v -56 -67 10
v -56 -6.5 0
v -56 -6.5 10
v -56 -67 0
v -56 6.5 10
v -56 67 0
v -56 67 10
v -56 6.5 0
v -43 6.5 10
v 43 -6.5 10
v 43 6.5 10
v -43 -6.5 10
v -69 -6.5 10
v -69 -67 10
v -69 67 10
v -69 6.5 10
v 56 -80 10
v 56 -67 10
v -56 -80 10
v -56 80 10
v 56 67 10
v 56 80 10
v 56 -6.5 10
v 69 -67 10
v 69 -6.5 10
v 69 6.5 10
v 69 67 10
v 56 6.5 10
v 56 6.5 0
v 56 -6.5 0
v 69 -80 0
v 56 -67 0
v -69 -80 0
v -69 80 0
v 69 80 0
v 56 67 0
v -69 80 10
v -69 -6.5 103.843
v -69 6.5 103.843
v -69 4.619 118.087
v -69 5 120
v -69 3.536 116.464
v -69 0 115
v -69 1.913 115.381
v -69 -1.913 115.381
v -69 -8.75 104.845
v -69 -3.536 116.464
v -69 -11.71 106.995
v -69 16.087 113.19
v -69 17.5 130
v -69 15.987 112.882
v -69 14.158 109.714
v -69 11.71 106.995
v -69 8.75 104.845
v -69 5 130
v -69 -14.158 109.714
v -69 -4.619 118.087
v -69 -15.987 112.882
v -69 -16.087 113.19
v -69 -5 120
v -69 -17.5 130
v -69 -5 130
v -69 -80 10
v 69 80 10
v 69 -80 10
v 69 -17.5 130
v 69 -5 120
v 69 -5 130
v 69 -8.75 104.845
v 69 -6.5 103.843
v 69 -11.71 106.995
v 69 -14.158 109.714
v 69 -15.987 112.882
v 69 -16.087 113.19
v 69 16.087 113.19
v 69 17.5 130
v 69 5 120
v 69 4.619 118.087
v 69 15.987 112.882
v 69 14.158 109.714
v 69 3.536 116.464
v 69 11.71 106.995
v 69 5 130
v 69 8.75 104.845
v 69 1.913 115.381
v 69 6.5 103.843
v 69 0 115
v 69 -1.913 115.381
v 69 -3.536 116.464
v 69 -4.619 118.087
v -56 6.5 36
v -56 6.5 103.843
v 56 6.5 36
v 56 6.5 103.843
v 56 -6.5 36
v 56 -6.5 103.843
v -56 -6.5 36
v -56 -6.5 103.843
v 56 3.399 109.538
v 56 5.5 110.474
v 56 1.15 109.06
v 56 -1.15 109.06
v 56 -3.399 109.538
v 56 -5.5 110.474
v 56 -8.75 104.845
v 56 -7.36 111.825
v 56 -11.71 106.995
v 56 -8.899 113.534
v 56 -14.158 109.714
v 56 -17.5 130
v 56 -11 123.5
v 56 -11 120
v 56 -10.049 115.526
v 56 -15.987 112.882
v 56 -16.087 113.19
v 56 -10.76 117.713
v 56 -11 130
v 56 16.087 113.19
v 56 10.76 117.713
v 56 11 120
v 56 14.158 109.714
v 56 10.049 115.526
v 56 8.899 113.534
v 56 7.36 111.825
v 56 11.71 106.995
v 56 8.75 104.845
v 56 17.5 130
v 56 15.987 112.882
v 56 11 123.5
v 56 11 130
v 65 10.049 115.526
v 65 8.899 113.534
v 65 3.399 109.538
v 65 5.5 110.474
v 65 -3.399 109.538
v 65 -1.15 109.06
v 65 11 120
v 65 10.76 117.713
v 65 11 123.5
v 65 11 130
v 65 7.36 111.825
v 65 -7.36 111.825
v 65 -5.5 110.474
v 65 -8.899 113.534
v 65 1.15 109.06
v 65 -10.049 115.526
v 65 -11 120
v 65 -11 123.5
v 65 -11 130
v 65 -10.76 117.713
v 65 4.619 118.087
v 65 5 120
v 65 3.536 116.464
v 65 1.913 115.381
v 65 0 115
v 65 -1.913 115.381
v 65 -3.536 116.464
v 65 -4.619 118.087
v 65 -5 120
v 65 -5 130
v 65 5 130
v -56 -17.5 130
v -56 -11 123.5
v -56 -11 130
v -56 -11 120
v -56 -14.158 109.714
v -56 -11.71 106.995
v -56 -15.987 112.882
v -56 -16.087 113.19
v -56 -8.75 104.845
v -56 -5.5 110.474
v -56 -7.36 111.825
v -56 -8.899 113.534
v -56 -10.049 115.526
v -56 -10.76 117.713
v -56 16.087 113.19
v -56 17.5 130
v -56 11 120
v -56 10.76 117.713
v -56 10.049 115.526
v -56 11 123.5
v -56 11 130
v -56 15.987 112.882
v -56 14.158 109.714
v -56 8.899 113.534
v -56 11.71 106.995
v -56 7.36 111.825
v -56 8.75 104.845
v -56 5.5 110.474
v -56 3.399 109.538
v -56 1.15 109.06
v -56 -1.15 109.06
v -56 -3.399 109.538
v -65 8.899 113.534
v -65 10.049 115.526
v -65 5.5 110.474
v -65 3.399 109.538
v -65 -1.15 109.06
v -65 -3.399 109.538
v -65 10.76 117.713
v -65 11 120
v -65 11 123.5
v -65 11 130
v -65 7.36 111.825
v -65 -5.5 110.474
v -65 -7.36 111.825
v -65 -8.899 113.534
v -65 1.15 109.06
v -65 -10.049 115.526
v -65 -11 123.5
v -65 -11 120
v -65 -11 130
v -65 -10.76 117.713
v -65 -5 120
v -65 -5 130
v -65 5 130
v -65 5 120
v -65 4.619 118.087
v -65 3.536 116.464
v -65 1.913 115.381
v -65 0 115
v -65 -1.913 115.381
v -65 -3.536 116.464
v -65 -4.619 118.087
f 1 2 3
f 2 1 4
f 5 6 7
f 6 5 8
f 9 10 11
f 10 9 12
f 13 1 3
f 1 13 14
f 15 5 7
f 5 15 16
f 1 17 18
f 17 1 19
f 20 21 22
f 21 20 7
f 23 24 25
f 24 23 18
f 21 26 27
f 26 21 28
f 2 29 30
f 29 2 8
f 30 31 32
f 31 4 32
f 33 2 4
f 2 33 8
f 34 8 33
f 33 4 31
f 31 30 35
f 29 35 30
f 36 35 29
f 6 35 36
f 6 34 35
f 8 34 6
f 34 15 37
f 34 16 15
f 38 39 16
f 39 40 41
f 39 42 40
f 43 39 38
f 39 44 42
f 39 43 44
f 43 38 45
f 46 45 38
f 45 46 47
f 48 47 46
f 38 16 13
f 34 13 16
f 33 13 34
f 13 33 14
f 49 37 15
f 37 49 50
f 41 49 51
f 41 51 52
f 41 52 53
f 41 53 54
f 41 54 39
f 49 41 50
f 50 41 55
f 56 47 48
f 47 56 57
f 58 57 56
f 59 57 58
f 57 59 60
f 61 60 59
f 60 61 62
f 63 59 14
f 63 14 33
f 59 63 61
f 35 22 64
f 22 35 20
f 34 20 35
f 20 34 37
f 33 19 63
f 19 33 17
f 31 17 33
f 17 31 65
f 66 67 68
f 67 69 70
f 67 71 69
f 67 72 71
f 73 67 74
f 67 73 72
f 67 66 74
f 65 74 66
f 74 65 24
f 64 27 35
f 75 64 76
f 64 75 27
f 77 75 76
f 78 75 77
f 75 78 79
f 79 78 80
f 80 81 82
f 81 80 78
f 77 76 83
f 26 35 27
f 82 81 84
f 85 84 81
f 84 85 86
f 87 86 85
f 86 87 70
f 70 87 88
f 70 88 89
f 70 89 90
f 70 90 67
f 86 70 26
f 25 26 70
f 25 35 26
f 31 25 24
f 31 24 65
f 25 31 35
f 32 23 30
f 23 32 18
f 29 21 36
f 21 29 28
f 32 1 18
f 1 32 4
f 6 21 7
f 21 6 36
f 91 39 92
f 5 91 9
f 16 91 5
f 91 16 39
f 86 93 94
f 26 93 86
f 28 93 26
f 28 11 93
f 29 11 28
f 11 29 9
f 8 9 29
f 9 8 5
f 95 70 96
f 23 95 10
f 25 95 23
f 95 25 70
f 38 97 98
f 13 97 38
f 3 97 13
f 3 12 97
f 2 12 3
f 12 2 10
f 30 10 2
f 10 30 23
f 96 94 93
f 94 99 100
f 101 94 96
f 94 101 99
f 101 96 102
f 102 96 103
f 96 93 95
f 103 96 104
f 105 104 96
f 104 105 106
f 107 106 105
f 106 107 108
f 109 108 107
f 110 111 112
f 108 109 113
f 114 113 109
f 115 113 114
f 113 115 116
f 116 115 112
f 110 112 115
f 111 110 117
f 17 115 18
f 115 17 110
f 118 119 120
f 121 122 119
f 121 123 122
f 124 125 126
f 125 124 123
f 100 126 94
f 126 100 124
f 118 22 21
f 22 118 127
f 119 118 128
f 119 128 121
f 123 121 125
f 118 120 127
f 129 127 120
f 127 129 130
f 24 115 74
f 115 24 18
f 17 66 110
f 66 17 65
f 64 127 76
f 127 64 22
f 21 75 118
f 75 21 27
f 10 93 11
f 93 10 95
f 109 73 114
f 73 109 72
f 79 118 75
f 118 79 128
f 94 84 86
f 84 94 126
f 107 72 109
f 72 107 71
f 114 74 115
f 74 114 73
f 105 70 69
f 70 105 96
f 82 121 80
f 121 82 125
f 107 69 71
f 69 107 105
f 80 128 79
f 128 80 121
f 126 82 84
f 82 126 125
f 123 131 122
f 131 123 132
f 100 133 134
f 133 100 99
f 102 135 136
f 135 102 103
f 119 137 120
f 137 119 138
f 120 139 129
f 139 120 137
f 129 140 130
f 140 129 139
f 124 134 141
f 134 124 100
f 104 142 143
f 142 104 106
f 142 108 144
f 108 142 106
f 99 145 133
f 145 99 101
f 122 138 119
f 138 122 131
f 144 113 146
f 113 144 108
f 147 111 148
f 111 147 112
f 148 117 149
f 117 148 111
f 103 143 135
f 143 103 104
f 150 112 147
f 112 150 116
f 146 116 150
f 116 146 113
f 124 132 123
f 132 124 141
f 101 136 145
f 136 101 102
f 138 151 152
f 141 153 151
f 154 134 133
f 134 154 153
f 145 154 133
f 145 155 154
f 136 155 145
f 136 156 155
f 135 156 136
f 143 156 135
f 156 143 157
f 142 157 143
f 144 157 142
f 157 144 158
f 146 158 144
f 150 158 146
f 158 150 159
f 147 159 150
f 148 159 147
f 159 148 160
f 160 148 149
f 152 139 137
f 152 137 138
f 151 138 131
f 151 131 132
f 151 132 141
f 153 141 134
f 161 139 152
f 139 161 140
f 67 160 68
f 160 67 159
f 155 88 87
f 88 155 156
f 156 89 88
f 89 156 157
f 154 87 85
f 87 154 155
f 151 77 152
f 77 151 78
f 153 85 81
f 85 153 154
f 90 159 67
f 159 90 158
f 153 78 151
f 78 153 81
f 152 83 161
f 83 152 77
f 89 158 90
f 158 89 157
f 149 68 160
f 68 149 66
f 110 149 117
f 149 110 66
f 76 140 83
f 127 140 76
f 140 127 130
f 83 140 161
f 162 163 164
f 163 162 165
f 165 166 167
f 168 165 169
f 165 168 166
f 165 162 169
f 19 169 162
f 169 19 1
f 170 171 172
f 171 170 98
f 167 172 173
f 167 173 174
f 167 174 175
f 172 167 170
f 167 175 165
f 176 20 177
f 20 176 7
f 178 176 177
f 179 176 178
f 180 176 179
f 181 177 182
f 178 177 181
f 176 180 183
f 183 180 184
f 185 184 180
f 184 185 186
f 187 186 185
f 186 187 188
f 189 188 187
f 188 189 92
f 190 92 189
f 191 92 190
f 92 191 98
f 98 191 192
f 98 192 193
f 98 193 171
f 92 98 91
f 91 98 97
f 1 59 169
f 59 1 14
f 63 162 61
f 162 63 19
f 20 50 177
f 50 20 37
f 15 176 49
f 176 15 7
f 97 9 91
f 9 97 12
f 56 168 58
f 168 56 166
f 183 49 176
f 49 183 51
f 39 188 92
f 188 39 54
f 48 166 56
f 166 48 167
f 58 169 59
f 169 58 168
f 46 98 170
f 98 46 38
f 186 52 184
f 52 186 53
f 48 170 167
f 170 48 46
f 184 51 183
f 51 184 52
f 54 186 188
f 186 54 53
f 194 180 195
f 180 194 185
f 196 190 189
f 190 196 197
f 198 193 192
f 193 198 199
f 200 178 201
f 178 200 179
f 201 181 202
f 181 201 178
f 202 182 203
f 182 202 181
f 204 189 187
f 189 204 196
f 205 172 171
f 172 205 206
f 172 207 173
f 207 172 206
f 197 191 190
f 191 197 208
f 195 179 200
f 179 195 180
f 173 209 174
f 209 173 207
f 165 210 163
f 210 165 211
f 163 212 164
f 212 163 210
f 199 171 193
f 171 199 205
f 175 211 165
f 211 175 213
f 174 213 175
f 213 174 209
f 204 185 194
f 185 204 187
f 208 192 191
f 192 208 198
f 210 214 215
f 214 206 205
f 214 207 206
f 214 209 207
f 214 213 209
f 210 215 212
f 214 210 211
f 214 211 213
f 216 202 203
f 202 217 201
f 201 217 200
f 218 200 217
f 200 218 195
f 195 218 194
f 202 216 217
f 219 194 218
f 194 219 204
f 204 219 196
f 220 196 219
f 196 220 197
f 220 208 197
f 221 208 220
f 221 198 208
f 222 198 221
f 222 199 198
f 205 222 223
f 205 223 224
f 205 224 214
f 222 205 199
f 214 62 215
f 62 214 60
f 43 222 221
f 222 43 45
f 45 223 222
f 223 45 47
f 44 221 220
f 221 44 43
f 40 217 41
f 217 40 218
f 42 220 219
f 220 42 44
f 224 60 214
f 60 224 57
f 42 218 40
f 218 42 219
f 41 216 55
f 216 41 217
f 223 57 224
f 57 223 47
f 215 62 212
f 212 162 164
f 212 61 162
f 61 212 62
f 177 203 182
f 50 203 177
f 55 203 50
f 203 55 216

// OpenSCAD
// file: common.scad
roll_diameter = 200;
roll_inner_diameter = 58;
roll_width = 72; 

roller_diameter= 22;
roller_diameter_inner= 10;
roller_width_inner=8;
roller_width = roller_width_inner + 2;

roll_center_height= roll_diameter/2 + 20;


holder_length = 160 ;
roll_adapter_width=10;

module roll() {
    difference(){
        cylinder(roll_width, d=roll_diameter);
        translate([0,0,-1])
            cylinder(roll_width+2, d=roll_inner_diameter);
    }
}

module roller(){
       cylinder(roller_width, d=roller_diameter);
}
// main file
include <./common.scad>

holder_side_width=roller_width + 3;
holder_side_clearence=20;

holder_width = roll_width + (holder_side_clearence*2) + (holder_side_width * 2);
holder_base_height = 10;


module holder_tower() {
    tower_roll_center_height = roll_center_height - holder_base_height;
    holder_tower_height =  tower_roll_center_height + roller_diameter * 2;
    
    rotate([90, 0, 90])
    intersection(){
        
        translate([-holder_length/ 2, 0, -holder_side_width])
            cube([holder_length, roll_center_height, holder_side_width *2]);
        union(){
            union() {
                linear_extrude(holder_side_width)
                polygon([
                    [-roller_diameter/2 , roll_center_height - holder_side_width /2 ],
                    [-roller_diameter/2 - holder_side_width /2, roll_center_height ],
                    [-holder_length/2, 0],
                    [-holder_length /2 + holder_side_width, 0]
                ]);
                
                linear_extrude(holder_side_width)
                polygon([
                    [roller_diameter/2 , roll_center_height - holder_side_width /2 ],
                    [roller_diameter/2 + holder_side_width /2, roll_center_height ],
                    [holder_length/2, 0],
                    [holder_length /2 - holder_side_width, 0]
                ]);
                              
                linear_extrude(holder_side_width)
                polygon([
                    [- holder_side_width /2, tower_roll_center_height - roller_diameter/2],
                    [ holder_side_width /2, tower_roll_center_height - roller_diameter/2],
                    [holder_side_width /2, 0],
                    [- holder_side_width /2, 0]
                ]);
                
                translate([-holder_side_width/2,0,0])
                rotate([0,90,0])
                linear_extrude(holder_side_width)
                polygon([
                    [ holder_side_width, 0],
                    [0, 0],
                    [0, holder_side_width * 2]
                ]);
            }
            
            translate([0, tower_roll_center_height, 0])
                difference(){
                    hull(){
                        translate([0, roller_diameter, 0])
                            cylinder(holder_side_width, d= roller_diameter + holder_side_width );
                        cylinder(holder_side_width, d= roller_diameter + holder_side_width );
                    }
                    translate([0, 0, -1])
                    hull(){
                        translate([0, roller_diameter, 0])
                            roller();
                        roller();
                    }
                    
                   translate([0,0,-roller_width])
                    hull(){
                        translate([0, roller_diameter, 0])
                    cylinder(roller_width *3, d=roller_diameter_inner);
                    cylinder(roller_width *3, d=roller_diameter_inner);
                    }
                }
            }
    }
}

module holder_base(){
    
    translate([-holder_width/2, -holder_length/2, 0])
        cube([holder_side_width, holder_length, holder_base_height]);
    
    translate([holder_width/2 - holder_side_width, -holder_length/2, 0])
        cube([holder_side_width, holder_length, holder_base_height]);
    
    
    translate([-holder_width/2 , -holder_length/2, 0])
        cube([holder_width,  holder_side_width, holder_base_height]);
    translate([-holder_width/2 , holder_length/2- holder_side_width , 0])
        cube([holder_width,  holder_side_width, holder_base_height]);
    translate([-holder_width/2 , - holder_side_width/2 , 0])
        cube([holder_width,  holder_side_width, holder_base_height]);
}

module holder() {
        union() {
            holder_base();
                                    
            translate([holder_width/2 - holder_side_width, 0, holder_base_height])
                holder_tower();
            
            mirror([1, 0, 0])
            translate([holder_width/2 - holder_side_width, 0, holder_base_height])
                holder_tower();
        }
}
%
translate([ -roll_width/2, 0, roll_center_height])
rotate([0,90,0])
roll();

holder();
